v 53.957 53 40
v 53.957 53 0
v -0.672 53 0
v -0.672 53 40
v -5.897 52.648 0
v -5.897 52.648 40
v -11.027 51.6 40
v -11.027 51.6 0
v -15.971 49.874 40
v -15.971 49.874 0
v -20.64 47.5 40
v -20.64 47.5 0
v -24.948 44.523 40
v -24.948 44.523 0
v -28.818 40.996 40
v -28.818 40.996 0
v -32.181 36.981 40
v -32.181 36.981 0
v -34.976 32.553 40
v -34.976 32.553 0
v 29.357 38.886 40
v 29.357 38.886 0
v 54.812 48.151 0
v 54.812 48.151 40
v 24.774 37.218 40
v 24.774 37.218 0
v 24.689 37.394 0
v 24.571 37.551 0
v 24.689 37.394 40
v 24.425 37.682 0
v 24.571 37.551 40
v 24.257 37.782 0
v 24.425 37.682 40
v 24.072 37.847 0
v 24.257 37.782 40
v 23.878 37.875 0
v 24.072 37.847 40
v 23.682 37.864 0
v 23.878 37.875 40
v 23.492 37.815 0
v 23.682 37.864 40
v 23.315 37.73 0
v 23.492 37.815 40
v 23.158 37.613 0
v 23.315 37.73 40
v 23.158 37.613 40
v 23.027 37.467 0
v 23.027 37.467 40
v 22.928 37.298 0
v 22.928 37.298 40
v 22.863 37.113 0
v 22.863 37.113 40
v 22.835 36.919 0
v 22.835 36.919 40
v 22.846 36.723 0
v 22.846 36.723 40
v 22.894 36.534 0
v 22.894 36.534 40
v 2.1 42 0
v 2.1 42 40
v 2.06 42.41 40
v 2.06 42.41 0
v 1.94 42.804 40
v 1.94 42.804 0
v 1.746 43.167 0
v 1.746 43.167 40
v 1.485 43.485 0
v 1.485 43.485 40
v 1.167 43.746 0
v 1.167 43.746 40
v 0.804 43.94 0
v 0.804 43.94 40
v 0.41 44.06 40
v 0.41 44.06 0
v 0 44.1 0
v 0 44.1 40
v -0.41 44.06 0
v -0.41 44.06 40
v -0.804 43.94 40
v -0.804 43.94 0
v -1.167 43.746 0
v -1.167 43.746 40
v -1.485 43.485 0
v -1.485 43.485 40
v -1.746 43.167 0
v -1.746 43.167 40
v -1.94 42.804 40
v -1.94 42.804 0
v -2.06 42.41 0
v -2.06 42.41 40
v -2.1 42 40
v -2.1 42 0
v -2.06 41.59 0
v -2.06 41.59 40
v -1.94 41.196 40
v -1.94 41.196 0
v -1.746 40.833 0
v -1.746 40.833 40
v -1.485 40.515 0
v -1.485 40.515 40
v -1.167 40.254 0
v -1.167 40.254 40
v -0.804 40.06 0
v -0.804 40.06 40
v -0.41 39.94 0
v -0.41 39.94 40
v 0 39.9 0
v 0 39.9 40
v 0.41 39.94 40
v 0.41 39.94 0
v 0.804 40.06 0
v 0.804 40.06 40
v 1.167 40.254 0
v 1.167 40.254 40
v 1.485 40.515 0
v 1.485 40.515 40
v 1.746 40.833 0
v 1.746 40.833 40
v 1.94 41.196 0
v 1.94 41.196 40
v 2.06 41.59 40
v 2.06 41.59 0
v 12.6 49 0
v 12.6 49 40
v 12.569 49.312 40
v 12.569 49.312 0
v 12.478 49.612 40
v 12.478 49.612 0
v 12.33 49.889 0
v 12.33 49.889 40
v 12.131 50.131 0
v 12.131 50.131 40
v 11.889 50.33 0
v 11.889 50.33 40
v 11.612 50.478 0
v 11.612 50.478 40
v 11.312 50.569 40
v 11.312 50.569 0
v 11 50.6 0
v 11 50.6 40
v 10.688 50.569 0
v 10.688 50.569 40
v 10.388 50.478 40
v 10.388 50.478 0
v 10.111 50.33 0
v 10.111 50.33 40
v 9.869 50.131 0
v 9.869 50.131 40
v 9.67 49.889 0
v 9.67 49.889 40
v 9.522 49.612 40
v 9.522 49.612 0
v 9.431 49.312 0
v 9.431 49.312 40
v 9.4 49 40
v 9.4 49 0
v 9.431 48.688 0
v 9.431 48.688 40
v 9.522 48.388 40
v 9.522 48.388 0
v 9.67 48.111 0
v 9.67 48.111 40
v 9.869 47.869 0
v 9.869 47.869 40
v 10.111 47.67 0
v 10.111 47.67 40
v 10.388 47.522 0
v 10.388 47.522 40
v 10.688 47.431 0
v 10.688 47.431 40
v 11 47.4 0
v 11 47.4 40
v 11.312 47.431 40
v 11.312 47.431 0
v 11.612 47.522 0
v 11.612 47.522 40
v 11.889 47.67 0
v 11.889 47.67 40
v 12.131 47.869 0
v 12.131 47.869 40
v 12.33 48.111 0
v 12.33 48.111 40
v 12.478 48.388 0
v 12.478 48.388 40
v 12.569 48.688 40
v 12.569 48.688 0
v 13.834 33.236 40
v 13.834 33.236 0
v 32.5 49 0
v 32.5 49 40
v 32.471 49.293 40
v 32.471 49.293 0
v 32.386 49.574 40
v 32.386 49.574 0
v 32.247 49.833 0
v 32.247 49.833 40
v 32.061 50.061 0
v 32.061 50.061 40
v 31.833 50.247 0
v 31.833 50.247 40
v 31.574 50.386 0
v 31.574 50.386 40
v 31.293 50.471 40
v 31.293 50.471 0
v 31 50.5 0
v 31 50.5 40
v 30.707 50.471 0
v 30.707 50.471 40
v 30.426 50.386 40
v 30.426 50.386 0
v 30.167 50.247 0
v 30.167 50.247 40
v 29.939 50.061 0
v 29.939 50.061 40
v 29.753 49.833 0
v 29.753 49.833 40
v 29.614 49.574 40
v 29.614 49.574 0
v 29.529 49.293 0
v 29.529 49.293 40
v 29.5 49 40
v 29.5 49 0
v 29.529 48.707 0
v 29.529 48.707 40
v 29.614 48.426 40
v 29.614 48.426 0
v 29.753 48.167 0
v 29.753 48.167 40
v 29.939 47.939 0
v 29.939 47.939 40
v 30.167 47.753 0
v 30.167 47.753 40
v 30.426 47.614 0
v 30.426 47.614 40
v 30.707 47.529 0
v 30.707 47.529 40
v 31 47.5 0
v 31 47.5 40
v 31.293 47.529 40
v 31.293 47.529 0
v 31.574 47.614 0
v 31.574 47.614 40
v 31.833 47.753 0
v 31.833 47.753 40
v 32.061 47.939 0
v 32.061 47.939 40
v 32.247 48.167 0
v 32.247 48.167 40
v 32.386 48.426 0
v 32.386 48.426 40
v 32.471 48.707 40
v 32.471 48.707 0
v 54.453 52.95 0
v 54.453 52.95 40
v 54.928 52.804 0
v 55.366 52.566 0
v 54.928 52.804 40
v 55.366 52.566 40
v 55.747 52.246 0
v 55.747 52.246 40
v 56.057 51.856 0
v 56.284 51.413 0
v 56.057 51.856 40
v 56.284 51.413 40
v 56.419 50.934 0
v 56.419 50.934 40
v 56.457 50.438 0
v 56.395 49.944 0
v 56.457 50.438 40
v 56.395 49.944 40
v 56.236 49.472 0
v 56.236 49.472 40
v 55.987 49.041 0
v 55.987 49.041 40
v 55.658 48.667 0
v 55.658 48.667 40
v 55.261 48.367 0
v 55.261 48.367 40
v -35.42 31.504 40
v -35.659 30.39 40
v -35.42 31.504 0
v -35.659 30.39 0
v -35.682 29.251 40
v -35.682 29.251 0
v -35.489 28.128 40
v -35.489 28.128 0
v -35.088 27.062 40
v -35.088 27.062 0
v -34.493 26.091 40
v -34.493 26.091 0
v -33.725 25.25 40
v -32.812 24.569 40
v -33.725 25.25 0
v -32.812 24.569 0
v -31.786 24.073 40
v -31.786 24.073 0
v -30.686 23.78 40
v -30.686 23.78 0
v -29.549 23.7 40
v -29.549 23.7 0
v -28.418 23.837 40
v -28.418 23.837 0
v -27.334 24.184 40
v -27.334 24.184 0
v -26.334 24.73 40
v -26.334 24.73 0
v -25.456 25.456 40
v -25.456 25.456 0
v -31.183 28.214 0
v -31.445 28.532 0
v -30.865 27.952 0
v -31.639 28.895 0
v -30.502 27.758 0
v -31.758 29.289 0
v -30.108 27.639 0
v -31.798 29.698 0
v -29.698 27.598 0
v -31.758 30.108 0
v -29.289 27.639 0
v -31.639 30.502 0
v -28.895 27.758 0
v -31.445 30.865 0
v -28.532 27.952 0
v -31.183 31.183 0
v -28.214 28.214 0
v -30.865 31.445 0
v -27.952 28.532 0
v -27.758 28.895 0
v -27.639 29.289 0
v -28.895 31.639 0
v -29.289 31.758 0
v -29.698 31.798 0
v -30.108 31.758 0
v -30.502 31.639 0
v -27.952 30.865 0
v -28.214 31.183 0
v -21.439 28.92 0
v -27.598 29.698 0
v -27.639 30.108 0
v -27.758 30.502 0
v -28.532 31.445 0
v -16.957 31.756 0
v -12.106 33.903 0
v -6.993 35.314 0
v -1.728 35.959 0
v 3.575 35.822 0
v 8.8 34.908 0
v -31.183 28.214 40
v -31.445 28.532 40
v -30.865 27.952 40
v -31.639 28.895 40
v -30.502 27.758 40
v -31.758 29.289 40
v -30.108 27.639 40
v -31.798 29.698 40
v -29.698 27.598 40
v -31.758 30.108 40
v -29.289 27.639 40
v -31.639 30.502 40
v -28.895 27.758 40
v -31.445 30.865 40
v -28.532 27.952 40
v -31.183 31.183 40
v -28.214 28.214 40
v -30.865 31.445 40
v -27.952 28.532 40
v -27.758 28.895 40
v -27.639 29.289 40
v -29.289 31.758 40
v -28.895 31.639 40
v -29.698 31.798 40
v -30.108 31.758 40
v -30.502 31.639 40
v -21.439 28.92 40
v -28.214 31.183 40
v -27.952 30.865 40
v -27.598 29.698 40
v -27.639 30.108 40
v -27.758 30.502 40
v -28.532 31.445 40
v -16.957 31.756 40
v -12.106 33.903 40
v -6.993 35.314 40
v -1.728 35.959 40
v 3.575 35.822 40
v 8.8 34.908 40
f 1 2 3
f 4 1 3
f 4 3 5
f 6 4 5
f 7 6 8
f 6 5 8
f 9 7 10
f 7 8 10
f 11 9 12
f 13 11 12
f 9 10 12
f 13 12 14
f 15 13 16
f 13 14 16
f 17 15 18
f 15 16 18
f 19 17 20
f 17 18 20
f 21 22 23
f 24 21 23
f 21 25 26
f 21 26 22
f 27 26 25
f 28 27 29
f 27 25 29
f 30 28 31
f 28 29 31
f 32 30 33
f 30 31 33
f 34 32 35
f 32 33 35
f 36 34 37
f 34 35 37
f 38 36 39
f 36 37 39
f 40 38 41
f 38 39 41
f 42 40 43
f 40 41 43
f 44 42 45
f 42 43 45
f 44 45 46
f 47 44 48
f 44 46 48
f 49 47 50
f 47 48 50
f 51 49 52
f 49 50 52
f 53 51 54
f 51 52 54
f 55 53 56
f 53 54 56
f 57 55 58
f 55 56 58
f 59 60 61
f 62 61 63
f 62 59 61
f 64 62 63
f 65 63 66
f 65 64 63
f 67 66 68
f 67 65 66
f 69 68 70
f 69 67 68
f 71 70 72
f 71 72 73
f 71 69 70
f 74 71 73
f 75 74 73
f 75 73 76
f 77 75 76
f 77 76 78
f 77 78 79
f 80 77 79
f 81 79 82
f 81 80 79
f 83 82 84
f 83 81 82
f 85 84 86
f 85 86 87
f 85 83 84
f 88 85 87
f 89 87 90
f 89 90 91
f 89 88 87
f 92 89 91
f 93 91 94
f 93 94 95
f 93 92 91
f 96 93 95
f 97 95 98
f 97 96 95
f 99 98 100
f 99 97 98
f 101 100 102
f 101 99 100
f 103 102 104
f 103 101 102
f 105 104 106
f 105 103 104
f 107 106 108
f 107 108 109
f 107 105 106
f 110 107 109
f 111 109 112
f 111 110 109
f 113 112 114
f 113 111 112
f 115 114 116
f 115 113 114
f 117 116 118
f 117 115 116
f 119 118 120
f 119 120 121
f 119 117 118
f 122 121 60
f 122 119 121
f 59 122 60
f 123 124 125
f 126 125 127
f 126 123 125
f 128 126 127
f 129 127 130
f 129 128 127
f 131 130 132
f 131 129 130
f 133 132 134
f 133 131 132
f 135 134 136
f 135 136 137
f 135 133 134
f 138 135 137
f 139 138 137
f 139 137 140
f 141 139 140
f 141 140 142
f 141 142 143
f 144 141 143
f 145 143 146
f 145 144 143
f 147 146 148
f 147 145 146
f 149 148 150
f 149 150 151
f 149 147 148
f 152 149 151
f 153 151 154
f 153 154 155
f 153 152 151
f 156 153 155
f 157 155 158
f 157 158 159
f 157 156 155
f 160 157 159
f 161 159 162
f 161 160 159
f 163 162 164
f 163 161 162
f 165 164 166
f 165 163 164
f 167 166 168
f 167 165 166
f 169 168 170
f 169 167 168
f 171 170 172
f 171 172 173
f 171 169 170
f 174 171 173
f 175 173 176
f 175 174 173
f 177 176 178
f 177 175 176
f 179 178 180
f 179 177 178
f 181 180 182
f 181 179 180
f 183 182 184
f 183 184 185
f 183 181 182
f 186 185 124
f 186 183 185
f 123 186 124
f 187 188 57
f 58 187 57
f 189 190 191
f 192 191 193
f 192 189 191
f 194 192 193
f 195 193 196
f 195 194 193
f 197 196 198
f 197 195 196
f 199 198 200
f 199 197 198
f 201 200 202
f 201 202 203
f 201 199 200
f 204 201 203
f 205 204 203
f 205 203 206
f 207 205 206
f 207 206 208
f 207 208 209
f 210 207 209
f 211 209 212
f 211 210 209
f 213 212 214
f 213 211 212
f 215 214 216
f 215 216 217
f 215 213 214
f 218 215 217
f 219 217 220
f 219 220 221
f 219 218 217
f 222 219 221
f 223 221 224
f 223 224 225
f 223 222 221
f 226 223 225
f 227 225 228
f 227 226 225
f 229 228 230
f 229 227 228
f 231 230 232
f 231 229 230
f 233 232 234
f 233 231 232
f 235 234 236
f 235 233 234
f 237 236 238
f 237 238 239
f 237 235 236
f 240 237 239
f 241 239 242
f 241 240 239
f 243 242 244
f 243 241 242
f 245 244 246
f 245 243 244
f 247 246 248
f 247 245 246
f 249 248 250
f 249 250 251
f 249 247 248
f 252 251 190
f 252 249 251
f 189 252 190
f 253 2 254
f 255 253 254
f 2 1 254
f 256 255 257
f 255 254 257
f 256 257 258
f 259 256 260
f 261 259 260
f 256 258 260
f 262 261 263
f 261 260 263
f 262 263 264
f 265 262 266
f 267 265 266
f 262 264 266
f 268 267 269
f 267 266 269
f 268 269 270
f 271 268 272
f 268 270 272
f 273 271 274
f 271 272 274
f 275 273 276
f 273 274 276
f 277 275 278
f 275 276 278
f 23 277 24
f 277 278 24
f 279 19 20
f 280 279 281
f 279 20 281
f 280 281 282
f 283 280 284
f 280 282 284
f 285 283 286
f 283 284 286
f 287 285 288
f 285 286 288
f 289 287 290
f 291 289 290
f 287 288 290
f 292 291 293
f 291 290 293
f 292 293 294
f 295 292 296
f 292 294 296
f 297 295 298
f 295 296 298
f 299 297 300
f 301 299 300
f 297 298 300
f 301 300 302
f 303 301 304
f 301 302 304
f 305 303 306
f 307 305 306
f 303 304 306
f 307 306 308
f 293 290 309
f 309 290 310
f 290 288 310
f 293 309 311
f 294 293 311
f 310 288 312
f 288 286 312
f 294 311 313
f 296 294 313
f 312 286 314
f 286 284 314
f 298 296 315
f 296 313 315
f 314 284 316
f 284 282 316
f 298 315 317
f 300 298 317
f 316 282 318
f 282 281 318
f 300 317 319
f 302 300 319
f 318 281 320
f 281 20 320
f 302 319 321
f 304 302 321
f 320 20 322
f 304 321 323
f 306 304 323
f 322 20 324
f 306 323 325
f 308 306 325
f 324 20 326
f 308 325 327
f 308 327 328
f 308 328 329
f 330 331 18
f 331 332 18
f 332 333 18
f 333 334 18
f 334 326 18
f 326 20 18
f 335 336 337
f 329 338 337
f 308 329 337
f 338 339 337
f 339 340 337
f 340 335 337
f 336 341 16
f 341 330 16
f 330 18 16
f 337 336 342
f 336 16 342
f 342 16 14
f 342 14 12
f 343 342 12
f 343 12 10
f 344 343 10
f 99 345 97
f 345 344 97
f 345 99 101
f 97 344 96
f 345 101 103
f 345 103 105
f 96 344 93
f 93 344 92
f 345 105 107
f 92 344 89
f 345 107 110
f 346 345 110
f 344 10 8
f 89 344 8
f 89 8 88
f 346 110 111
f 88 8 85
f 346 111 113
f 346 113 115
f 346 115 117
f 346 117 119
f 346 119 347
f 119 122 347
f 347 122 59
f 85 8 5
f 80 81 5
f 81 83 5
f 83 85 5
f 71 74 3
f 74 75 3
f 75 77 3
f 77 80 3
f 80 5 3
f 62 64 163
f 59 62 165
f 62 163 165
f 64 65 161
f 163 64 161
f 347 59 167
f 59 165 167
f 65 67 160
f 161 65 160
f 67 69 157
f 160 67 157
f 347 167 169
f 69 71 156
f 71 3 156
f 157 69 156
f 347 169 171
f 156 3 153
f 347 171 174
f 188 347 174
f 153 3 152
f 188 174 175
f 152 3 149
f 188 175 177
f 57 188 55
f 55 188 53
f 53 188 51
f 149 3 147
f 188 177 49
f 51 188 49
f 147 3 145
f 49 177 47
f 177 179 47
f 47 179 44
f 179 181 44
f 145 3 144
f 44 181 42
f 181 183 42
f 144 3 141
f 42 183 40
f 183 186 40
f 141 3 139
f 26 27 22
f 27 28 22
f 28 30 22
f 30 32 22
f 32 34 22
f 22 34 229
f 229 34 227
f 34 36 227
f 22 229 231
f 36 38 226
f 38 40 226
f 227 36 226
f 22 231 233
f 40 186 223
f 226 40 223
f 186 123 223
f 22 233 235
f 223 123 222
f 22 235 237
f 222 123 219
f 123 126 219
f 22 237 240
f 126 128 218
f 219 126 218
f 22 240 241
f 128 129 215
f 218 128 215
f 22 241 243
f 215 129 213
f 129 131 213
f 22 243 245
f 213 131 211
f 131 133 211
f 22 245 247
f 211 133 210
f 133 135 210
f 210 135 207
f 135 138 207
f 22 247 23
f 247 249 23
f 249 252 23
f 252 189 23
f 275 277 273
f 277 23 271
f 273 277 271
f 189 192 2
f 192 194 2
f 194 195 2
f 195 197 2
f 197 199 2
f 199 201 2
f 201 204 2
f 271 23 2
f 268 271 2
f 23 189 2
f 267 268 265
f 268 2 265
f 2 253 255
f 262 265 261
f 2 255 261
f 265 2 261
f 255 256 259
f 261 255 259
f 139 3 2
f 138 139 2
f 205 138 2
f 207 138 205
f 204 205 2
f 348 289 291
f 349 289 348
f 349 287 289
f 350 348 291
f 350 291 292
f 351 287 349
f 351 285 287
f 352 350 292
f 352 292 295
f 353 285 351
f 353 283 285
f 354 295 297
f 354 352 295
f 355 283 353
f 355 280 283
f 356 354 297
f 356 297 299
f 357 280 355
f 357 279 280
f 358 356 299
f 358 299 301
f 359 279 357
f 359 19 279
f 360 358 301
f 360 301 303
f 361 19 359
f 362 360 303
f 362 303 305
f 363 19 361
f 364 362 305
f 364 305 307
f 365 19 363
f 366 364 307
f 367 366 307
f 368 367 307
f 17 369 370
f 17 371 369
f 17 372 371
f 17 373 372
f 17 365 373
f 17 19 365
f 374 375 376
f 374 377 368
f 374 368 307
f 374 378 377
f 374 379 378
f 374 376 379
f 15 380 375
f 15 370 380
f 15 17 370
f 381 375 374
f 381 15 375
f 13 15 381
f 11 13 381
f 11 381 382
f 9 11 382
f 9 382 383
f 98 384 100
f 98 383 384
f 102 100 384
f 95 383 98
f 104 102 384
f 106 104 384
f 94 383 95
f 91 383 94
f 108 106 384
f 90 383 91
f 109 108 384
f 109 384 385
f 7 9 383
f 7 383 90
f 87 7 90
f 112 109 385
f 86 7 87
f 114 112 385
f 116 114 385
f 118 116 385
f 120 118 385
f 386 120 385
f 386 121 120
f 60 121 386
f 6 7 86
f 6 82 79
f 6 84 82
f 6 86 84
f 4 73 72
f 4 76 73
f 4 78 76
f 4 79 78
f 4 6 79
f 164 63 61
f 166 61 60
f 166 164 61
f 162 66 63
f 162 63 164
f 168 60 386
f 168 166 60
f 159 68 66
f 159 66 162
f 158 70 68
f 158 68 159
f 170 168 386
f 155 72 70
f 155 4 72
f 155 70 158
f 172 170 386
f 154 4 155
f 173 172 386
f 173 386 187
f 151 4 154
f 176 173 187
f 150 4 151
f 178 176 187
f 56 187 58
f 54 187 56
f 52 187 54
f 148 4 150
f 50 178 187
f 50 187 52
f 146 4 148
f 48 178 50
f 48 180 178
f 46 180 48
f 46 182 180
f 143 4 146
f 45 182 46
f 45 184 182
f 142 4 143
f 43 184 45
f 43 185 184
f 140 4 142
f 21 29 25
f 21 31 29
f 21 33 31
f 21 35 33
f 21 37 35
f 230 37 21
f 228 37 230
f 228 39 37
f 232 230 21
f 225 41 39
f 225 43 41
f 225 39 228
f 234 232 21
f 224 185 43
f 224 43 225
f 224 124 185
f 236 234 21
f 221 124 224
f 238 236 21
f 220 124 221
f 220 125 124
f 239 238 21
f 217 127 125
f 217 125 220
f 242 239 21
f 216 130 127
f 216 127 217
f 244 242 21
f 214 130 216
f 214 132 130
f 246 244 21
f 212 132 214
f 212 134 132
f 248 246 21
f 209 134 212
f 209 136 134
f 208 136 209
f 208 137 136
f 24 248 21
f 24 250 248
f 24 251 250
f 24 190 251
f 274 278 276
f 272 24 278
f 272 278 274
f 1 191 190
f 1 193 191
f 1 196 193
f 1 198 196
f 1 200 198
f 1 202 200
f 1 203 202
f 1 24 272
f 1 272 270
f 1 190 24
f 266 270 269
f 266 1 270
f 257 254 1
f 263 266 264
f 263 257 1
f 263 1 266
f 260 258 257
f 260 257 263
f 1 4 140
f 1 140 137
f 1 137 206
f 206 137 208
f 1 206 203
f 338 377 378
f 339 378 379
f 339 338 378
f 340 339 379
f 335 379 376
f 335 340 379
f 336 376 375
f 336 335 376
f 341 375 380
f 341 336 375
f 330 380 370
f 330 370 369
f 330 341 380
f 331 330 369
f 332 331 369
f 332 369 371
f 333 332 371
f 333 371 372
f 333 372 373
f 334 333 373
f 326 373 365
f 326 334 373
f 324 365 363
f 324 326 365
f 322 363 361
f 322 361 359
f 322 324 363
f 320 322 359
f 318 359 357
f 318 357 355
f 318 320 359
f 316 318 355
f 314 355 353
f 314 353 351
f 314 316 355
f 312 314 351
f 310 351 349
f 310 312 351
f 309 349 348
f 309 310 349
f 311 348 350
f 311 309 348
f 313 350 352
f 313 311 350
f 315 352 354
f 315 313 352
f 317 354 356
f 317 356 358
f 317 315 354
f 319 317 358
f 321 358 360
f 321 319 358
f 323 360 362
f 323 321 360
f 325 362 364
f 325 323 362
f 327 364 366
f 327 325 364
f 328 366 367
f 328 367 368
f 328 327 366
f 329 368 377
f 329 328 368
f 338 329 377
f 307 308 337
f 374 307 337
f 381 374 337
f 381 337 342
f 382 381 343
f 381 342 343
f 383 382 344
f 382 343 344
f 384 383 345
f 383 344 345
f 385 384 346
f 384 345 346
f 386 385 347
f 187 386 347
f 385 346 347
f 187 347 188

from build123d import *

# Parameters (mm, degrees)
SKETCH_1_R          = 2.1
SKETCH_1_R_2        = 6
EXTRUDE_1_DEPTH     = 40
FILLET_1_R          = 2.5
CUT_EXTRUDE_START   = -40
SKETCH_3_R          = 1.6
SKETCH_3_R_2        = 1.5
SKETCH_3_R_3        = 2.1
CUT_EXTRUDE_2_DEPTH = 40
CUT_EXTRUDE_3_REACH = 89.157
SKETCH_4_R          = 1


with BuildPart() as part:
    # 草图1 → 凸台-拉伸1 (new body)
    # profile 1 of 3: a face of its own
    with BuildSketch(Plane.XY):
        with BuildLine():
            Line((68.135486627, 53), (-0.671642545, 53))
            ThreePointArc((-0.671642545, 53), (15.918389352, 49.295479077), (29.356722765, 38.885684233))
            Line((29.356722765, 38.885684233), (68.135486627, 53))
        make_face()
    # profile 2 of 3: a face of its own
    with BuildSketch(Plane.XY):
        with BuildLine():
            ThreePointArc((29.356722765, 38.885684233), (15.918389352, 49.295479077), (-0.671642545, 53))
            ThreePointArc((-0.671642545, 53), (-20.639649059, 47.500428563), (-34.976092597, 32.552754602))
            ThreePointArc((-34.976092597, 32.552754602), (-28.226351446, 35.515083761), (-23.69848481, 29.69848481))
            ThreePointArc((-23.69848481, 29.69848481), (-24.155207625, 27.402384191), (-25.45584416, 25.455844085))
            ThreePointArc((-25.45584416, 25.455844085), (-6.992802508, 35.314313148), (13.833943007, 33.235854448))
            Line((13.833943007, 33.235854448), (29.356722765, 38.885684233))
        make_face()
        with Locations((0, 42)):
            Circle(SKETCH_1_R, mode=Mode.SUBTRACT)
    # profile 3 of 3: a face of its own
    with BuildSketch(Plane.XY):
        with Locations((-29.69848481, 29.69848481)):
            Circle(SKETCH_1_R_2)
        with Locations((-29.69848481, 29.69848481)):
            Circle(SKETCH_1_R, mode=Mode.SUBTRACT)
    extrude(amount=EXTRUDE_1_DEPTH)

    # 圆角1
    fillet_1_edges = [part.edges().sort_by_distance(p)[0] for p in [
        (68.135486627, 53, 20),
    ]]
    fillet(fillet_1_edges, radius=FILLET_1_R)

    # 草图3 → 切除-拉伸2 (cut)
    with BuildSketch(Plane.XY.offset(40).offset(CUT_EXTRUDE_START)):
        with Locations((11, 49)):
            Circle(SKETCH_3_R)
        with Locations((31, 49)):
            Circle(SKETCH_3_R_2)
        with Locations((0, 42)):
            Circle(SKETCH_3_R_3)
    extrude(amount=CUT_EXTRUDE_2_DEPTH, mode=Mode.SUBTRACT)

    # 草图4 → 切除-拉伸3 (cut, up to next)
    with BuildSketch(Plane.XY.offset(40), mode=Mode.PRIVATE) as cut_extrude_3_sk1:
        with Locations((23.833943007, 36.87555679)):
            Circle(SKETCH_4_R)
    cut_extrude_3_tool1 = extrude(cut_extrude_3_sk1.sketch, amount=-CUT_EXTRUDE_3_REACH, mode=Mode.PRIVATE) & part.part
    add(cut_extrude_3_tool1.solids().sort_by_distance((23.833943, 36.875557, 40))[0], mode=Mode.SUBTRACT)


solid = part.part
